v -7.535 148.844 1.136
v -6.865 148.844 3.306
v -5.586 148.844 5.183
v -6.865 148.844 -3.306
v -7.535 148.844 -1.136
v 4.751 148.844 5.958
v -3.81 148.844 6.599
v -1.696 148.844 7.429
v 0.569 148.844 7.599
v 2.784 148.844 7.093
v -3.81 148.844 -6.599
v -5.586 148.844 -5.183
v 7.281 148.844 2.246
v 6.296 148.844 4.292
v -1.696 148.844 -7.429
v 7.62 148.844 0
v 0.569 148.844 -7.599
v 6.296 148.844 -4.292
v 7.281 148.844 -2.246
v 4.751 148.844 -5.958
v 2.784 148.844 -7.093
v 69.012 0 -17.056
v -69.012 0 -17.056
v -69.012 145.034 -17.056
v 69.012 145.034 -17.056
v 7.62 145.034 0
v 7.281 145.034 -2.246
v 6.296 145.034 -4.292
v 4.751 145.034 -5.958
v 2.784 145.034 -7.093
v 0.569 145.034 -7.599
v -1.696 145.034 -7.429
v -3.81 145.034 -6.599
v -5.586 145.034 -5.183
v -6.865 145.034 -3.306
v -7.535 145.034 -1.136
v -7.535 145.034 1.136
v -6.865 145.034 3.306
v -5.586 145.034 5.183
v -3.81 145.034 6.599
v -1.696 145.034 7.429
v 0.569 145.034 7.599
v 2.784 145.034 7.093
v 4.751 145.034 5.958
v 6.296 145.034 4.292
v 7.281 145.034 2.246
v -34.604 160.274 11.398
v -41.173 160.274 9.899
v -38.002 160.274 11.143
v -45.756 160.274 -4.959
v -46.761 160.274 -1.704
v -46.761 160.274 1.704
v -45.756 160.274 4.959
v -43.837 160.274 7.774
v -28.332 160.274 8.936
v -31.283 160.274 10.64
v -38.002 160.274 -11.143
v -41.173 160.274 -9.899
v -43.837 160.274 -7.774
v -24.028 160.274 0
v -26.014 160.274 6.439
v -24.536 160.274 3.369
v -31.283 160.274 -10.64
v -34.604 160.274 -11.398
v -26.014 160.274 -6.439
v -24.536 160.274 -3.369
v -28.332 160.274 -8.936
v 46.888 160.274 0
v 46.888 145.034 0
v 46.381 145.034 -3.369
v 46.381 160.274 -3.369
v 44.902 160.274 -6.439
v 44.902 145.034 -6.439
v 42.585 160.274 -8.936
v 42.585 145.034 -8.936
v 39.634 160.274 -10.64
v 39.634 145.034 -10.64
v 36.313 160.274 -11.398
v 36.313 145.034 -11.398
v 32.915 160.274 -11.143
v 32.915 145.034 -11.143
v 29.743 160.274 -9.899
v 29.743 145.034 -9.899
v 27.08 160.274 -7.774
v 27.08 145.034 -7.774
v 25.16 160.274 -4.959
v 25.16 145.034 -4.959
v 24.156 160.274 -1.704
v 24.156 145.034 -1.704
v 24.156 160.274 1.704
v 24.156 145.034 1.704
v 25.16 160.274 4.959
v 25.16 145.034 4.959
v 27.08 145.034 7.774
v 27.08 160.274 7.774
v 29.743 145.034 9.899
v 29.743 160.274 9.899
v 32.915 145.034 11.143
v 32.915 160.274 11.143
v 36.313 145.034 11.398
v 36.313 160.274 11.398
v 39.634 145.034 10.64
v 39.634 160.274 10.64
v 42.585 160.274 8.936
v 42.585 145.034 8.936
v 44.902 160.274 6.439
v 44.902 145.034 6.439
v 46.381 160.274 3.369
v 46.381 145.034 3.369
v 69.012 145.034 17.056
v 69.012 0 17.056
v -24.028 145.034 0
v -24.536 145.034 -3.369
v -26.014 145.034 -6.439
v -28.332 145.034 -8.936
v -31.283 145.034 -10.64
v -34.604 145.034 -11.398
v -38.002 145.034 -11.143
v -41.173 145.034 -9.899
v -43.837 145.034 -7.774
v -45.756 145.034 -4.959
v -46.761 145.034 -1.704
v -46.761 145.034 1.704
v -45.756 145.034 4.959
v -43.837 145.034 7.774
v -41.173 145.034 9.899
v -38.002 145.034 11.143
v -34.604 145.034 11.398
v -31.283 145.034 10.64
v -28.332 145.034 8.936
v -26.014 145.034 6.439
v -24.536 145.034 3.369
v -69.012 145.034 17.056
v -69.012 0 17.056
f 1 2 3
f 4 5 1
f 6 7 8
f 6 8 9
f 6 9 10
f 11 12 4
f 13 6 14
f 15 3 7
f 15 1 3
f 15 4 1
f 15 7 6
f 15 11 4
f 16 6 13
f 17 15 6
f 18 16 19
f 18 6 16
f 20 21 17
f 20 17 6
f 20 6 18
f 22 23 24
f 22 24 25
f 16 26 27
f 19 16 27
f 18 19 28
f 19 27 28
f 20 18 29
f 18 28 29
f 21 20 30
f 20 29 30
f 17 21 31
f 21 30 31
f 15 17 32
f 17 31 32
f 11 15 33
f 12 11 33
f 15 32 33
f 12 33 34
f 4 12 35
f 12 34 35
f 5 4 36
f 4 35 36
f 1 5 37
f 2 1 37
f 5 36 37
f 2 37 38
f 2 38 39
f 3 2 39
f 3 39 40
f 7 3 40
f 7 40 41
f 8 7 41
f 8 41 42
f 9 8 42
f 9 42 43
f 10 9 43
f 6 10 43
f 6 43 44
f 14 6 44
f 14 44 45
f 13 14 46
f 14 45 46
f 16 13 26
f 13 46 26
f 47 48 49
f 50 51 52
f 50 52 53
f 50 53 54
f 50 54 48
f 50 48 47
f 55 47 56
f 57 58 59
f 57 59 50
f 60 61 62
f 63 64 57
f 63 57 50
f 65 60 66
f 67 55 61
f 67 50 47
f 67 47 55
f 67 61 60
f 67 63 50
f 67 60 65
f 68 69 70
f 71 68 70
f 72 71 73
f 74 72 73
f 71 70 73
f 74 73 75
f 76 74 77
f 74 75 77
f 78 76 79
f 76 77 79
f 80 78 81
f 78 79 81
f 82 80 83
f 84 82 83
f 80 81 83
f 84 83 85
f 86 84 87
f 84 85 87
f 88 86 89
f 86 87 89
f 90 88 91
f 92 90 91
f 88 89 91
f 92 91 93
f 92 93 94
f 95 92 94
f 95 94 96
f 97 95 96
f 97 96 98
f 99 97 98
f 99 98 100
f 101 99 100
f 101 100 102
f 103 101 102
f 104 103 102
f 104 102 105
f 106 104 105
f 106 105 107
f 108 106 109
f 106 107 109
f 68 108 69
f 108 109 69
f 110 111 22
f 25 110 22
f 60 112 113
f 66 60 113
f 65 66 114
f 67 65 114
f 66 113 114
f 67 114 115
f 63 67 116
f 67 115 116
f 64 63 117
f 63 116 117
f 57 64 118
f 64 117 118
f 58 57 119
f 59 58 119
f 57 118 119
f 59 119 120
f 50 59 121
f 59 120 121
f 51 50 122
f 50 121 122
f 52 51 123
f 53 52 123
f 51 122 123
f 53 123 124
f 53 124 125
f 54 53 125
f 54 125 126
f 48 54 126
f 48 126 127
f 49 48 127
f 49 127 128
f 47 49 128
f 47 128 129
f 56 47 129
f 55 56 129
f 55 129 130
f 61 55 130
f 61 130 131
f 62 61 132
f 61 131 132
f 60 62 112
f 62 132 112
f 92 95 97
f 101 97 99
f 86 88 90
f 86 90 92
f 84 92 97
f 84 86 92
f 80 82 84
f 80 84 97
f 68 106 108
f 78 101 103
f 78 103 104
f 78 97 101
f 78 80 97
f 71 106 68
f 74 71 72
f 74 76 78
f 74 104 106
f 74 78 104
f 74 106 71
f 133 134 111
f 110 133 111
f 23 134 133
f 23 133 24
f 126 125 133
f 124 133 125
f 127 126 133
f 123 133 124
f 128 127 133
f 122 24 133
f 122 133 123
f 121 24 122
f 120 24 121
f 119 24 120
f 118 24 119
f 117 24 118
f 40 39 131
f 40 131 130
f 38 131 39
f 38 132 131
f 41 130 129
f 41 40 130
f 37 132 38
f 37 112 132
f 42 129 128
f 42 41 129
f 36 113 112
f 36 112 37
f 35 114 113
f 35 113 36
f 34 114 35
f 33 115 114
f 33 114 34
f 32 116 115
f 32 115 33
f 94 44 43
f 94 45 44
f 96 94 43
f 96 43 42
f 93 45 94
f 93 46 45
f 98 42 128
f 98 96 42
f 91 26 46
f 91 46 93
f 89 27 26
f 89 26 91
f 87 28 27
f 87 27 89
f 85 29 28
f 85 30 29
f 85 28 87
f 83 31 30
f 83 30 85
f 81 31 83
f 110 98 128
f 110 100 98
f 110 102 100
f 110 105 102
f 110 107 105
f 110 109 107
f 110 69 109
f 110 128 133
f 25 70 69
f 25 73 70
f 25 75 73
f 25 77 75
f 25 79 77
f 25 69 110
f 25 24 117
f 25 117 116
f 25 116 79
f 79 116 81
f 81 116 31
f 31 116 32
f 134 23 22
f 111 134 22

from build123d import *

# Parameters (mm, degrees)
SKETCH1_W           = 138.0236
SKETCH1_H           = 34.1122
BOSS_EXTRUDE1_DEPTH = 145.034
SKETCH2_R           = 11.43
BOSS_EXTRUDE2_DEPTH = 15.24
SKETCH3_R           = 7.62
BOSS_EXTRUDE3_DEPTH = 3.81


with BuildPart() as part:
    # Sketch1 → Boss-Extrude1 (new body)
    with BuildSketch(Plane(origin=(0, 0, 0), x_dir=(1, 0, 0), z_dir=(0, 1, 0))):
        Rectangle(SKETCH1_W, SKETCH1_H)
    extrude(amount=BOSS_EXTRUDE1_DEPTH)

    # Sketch2 → Boss-Extrude2 (add)
    with BuildSketch(Plane(origin=(0, 145.034, 0), x_dir=(1, 0, 0), z_dir=(0, 1, 0))):
        with Locations((-35.4584, 0)):
            Circle(SKETCH2_R)
        with Locations((35.4584, 0)):
            Circle(SKETCH2_R)
    extrude(amount=BOSS_EXTRUDE2_DEPTH)

    # Sketch3 → Boss-Extrude3 (add)
    with BuildSketch(Plane(origin=(0, 145.034, 0), x_dir=(1, 0, 0), z_dir=(0, 1, 0))):
        Circle(SKETCH3_R)
    extrude(amount=BOSS_EXTRUDE3_DEPTH)


solid = part.part
